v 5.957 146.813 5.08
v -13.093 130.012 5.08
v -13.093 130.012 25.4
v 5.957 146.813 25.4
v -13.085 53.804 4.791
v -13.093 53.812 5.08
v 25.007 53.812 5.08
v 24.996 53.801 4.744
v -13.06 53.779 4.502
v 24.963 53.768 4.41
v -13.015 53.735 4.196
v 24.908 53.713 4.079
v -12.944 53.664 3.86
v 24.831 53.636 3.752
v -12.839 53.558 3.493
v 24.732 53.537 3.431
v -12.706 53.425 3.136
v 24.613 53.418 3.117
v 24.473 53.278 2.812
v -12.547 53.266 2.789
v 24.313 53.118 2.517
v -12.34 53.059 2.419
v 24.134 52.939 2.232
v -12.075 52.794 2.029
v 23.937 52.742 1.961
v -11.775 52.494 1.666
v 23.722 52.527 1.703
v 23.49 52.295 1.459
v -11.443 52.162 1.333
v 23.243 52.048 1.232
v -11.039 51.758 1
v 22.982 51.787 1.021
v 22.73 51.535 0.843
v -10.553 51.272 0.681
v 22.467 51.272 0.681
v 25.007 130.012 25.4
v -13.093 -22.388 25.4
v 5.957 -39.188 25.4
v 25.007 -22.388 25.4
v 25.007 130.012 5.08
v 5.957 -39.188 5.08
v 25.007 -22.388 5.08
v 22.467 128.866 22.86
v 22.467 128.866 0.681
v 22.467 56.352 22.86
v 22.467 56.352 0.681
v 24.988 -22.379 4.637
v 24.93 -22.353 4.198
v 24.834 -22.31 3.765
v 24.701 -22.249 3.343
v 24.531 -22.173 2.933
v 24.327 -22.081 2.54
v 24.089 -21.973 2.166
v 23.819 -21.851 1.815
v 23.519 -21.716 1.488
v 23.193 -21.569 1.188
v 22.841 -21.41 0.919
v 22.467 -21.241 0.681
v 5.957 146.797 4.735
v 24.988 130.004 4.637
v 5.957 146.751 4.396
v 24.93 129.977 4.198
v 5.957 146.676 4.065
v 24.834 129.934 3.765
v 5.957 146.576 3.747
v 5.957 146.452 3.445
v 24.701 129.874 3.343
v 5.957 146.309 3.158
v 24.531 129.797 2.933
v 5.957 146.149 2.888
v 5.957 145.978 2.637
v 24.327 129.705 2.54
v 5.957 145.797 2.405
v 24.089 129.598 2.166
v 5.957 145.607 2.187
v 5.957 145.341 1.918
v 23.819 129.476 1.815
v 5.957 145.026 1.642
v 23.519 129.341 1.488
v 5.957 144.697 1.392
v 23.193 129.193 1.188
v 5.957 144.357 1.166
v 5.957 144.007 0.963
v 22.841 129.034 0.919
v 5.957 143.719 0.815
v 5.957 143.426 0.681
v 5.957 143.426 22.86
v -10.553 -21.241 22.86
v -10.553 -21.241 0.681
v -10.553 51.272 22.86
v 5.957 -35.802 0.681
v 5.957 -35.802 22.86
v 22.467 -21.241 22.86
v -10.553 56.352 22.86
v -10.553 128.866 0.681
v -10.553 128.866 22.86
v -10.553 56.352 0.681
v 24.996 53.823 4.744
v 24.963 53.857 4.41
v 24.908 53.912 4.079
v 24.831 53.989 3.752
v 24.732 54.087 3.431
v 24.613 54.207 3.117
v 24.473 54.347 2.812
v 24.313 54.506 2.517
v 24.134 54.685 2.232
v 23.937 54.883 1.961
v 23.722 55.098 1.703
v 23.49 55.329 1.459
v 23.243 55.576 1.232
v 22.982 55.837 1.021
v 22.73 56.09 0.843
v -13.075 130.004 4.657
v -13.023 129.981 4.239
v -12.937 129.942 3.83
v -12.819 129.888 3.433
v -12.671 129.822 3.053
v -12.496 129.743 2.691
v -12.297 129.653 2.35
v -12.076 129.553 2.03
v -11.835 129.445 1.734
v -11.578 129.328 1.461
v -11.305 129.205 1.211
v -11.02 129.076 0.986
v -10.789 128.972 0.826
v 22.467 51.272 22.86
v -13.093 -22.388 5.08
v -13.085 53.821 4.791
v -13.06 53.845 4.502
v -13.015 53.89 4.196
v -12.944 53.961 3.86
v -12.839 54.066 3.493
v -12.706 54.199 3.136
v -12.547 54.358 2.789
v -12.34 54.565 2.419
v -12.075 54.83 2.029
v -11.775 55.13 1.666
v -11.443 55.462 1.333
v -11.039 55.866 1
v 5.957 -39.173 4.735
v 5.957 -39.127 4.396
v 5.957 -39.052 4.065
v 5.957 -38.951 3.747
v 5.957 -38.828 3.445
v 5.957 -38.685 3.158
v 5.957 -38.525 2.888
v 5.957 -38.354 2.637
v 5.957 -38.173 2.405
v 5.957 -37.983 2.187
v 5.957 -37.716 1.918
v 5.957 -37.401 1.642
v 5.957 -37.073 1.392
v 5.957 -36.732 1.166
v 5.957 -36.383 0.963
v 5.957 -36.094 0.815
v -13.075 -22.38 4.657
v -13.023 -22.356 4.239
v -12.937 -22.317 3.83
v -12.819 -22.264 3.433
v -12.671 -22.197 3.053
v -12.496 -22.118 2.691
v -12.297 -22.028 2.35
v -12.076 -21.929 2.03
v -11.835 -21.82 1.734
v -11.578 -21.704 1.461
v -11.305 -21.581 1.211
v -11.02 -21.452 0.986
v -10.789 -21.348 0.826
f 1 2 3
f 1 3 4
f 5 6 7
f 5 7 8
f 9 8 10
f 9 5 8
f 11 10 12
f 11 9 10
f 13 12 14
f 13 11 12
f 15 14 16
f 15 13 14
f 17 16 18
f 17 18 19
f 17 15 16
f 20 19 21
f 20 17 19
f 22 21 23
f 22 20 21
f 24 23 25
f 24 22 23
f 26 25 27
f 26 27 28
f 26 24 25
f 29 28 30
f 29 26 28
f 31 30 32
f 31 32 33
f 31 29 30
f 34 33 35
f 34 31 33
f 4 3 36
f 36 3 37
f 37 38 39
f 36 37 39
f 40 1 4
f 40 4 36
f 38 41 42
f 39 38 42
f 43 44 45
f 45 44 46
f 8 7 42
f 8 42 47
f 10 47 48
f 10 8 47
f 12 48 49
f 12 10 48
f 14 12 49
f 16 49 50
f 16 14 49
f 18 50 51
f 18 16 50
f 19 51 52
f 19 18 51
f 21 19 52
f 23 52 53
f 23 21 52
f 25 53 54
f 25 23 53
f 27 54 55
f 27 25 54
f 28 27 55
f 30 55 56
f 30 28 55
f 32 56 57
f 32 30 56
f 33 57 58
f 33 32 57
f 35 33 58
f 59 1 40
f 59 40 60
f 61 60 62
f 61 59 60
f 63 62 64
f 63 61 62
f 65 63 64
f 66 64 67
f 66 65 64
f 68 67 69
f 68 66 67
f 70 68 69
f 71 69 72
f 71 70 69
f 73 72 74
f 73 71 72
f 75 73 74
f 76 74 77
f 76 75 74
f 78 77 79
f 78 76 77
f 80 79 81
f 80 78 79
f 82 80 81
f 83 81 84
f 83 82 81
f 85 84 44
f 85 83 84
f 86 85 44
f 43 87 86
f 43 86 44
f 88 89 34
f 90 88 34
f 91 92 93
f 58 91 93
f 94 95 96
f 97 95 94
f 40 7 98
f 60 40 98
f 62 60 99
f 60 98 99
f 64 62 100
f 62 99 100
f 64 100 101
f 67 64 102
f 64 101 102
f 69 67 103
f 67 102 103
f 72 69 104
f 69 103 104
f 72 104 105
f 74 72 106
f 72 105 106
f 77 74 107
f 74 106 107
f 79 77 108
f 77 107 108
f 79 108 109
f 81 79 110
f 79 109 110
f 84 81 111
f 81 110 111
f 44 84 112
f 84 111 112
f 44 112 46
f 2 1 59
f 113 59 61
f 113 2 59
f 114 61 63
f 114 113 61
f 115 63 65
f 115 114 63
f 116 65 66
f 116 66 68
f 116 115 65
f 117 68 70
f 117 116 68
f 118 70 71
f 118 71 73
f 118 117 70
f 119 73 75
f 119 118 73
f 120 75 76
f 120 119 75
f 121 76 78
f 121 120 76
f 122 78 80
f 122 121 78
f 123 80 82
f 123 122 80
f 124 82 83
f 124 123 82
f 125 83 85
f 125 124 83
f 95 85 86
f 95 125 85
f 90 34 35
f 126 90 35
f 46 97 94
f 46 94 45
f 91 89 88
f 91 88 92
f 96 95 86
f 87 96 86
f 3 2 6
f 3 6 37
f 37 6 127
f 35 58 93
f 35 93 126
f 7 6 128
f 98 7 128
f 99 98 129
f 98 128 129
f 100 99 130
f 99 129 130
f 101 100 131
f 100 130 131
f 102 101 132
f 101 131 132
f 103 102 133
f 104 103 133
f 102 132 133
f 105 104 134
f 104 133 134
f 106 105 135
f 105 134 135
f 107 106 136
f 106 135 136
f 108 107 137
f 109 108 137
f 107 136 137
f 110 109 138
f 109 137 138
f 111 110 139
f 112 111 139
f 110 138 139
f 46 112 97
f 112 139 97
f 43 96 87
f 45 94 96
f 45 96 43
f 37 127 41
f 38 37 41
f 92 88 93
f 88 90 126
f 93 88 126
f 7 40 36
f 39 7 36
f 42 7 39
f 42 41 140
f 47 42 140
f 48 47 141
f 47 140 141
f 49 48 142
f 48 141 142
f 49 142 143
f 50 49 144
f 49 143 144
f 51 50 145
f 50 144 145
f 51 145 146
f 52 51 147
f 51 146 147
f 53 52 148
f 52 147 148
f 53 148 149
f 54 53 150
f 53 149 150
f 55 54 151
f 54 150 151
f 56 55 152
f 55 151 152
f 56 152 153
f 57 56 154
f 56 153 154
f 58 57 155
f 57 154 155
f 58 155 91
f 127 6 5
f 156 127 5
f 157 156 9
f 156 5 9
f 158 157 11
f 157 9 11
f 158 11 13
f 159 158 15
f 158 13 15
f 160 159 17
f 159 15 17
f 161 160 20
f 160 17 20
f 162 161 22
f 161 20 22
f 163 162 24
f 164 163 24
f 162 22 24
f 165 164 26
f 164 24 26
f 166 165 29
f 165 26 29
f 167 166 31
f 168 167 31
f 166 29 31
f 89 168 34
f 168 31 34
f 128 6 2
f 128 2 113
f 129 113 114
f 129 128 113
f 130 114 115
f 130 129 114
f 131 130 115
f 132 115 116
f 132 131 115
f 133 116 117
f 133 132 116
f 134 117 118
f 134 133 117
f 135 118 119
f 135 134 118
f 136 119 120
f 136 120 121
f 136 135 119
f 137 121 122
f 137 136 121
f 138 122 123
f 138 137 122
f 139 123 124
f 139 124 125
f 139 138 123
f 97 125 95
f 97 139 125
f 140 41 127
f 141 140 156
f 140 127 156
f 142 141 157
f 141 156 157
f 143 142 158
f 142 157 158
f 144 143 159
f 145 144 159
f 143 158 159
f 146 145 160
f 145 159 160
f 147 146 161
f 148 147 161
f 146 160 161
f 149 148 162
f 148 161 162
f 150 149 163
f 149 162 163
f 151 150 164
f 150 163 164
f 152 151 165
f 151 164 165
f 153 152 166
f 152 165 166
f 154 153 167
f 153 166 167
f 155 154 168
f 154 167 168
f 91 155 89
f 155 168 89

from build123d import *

# Parameters (mm, degrees)
F1_DEPTH    = 25.4
F0_W        = 38.1
F0_H        = 76.2
F2_DEPTH    = 25.4
F3_T        = -2.54
F4_T1_DEPTH = 101.6
F4_T3_DEPTH = 50.8
F4_T5_DEPTH = 50.8
F4_T7_DEPTH = 63.5


# Not quite as in the source:
# - a fillet or chamfer that OpenCascade refuses, or shapes differently, is made with other operations: its cross-section is extruded or revolved along the edge and cut away or added


with BuildPart() as f1:
    # F0 (on Top) → F1 (new body)
    with BuildSketch(Plane.XY):
        Polygon((25.0072174214, -22.3877525396), (-13.0927825786, -22.3877525396), (5.9572174214, -39.1882733649), align=None)
    extrude(amount=F1_DEPTH)

    # F0 (on Top) → F2 (join)
    with BuildSketch(Plane.XY):
        with Locations((5.9572174214, 15.7122474604)):
            Rectangle(F0_W, F0_H)
    extrude(amount=F2_DEPTH)

    # F3
    f3_openings = [f1.faces().sort_by_distance(p)[0] for p in [
        (5.957217, 11.373102, 0),
    ]]
    offset(amount=F3_T, openings=f3_openings)

    # F4: fillet of radius 5.08 on 5 edges, made by hand

    # F4_s2 → F4_t1 (cut)
    with BuildSketch(Plane.XZ.offset(-66.5122474604)):
        with BuildLine():
            ThreePointArc((25.0072174214, 5.08), (23.5193198698, 1.4878975516), (19.9272174214, 0))
            Line((19.9272174214, 0), (25.0072174214, 0))
            Line((25.0072174214, 0), (25.0072174214, 5.08))
        make_face()
        with BuildLine():
            ThreePointArc((-13.0927825786, 5.08), (-11.604885027, 1.4878975516), (-8.0127825786, 0))
            Line((-8.0127825786, 0), (-13.0927825786, 0))
            Line((-13.0927825786, 0), (-13.0927825786, 5.08))
        make_face()
    extrude(amount=F4_T1_DEPTH, mode=Mode.SUBTRACT)

    # F4_s4 → F4_t3 (cut)
    with BuildSketch(Plane(origin=(-25.6145200068, -22.5898832967, 0), x_dir=(0, 0, 1), z_dir=(0.75, 0.6614378278, 0))):
        with BuildLine():
            ThreePointArc((5.08, 33.3315339744), (1.4878975516, 31.8436364228), (0, 28.2515339744))
            Line((0, 28.2515339744), (0, 33.3315339744))
            Line((0, 33.3315339744), (5.08, 33.3315339744))
        make_face()
    extrude(amount=F4_T3_DEPTH, mode=Mode.SUBTRACT)

    # F4_s6 → F4_t5 (cut)
    with BuildSketch(Plane(origin=(-5.7836103942, 5.1006649277, 0), x_dir=(0, 0, 1), z_dir=(0.75, -0.6614378278, 0))):
        with BuildLine():
            ThreePointArc((5.08, 25.4508760729), (1.4878975516, 23.9629785214), (0, 20.3708760729))
            Line((0, 20.3708760729), (0, 25.4508760729))
            Line((0, 25.4508760729), (5.08, 25.4508760729))
        make_face()
    extrude(amount=F4_T5_DEPTH, mode=Mode.SUBTRACT)

    # F4_s8 → F4_t7 (cut)
    with BuildSketch(Plane.YZ.offset(-25.7927825786)):
        with BuildLine():
            ThreePointArc((53.8122474604, 5.08), (52.3243499088, 1.4878975516), (48.7322474604, 0))
            Line((48.7322474604, 0), (53.8122474604, 0))
            Line((53.8122474604, 0), (53.8122474604, 5.08))
        make_face()
    extrude(amount=F4_T7_DEPTH, mode=Mode.SUBTRACT)

    # F5: F1 across face


with BuildPart() as f1_1:
    add(f1.part)
    add(f1.part.mirror(Plane(origin=(5.9572174214, 53.8122474604, 15.24), x_dir=(-1, 0, 0), z_dir=(0, 1, 0))))


solid = f1_1.part
